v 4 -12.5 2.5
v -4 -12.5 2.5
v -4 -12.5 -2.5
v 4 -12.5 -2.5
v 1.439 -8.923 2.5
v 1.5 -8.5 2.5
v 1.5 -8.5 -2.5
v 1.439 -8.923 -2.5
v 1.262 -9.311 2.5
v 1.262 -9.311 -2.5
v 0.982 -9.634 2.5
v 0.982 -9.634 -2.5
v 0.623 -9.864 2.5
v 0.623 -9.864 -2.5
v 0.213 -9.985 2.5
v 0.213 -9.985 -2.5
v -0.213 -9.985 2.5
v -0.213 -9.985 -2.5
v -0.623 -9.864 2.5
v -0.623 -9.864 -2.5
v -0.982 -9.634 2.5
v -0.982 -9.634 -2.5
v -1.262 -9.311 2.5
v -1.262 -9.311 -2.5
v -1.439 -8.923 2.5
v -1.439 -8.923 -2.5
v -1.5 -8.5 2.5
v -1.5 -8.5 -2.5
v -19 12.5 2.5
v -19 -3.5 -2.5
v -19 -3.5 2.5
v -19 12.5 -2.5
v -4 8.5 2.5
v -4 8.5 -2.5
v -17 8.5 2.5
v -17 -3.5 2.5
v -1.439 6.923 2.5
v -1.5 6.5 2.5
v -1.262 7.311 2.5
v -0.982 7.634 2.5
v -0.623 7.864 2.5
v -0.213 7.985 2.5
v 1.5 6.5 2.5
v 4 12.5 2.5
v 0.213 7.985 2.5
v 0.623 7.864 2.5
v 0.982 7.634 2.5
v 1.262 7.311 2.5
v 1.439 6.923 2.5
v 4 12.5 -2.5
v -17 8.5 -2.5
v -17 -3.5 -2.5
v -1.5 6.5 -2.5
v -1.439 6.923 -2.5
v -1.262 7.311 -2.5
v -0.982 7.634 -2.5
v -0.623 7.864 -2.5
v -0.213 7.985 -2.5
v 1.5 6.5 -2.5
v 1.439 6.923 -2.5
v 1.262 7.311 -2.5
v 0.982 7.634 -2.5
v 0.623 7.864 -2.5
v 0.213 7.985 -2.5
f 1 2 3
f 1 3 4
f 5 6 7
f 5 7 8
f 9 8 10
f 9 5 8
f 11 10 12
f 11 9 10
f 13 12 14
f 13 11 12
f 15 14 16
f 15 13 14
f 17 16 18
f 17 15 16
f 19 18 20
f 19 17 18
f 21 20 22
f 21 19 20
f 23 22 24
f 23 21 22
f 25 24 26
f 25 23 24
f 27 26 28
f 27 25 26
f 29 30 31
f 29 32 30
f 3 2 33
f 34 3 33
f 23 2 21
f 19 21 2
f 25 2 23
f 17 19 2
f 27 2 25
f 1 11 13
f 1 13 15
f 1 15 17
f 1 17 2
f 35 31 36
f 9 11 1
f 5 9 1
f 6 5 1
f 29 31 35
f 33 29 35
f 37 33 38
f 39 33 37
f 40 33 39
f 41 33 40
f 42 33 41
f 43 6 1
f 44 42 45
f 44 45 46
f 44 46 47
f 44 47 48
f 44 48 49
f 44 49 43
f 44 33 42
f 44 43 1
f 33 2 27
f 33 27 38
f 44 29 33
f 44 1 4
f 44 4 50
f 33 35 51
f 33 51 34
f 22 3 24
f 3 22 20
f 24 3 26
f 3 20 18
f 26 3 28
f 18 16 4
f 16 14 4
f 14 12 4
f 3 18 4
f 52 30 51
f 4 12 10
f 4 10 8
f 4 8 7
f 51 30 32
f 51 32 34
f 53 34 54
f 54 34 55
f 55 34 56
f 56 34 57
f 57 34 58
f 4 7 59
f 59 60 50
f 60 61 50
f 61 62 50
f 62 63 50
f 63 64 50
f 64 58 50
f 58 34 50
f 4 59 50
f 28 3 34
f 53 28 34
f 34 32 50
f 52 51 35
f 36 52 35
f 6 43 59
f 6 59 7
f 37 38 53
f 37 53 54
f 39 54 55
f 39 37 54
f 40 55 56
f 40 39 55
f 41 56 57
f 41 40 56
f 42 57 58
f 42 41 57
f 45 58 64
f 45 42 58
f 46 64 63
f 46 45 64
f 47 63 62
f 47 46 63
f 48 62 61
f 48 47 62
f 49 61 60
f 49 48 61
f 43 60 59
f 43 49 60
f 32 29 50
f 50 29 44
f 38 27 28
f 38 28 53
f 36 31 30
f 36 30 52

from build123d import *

# Parameters (mm, degrees)
SKETCH1_W           = 8
SKETCH1_H           = 25
BOSS_EXTRUDE6_DEPTH = 2.5
SKETCH8_W           = 15
SKETCH8_H           = 4
BOSS_EXTRUDE7_DEPTH = 5
SKETCH9_W           = 2
SKETCH9_H           = 5
BOSS_EXTRUDE8_DEPTH = 12
CUT_EXTRUDE1_DEPTH  = 6


with BuildPart() as part:
    # Sketch1 → Boss-Extrude6 (new body, symmetric)
    with BuildSketch(Plane.XY):
        Rectangle(SKETCH1_W, SKETCH1_H)
    extrude(amount=BOSS_EXTRUDE6_DEPTH, both=True)

    # Sketch8 → Boss-Extrude7 (add)
    with BuildSketch(Plane.XY.offset(2.5)):
        with Locations((-11.5, 10.5)):
            Rectangle(SKETCH8_W, SKETCH8_H)
    extrude(amount=-BOSS_EXTRUDE7_DEPTH)

    # Sketch9 → Boss-Extrude8 (add)
    with BuildSketch(Plane.XZ.offset(-8.5)):
        with Locations((-18, 0)):
            Rectangle(SKETCH9_W, SKETCH9_H)
    extrude(amount=BOSS_EXTRUDE8_DEPTH)

    # Sketch10 → Cut-Extrude1 (cut, through all)
    with BuildSketch(Plane.XY.offset(2.5)):
        with BuildLine():
            Line((1.5, 6.5), (1.5, -8.5))
            ThreePointArc((1.5, -8.5), (0, -10), (-1.5, -8.5))
            Line((-1.5, -8.5), (-1.5, 6.5))
            ThreePointArc((-1.5, 6.5), (0, 8), (1.5, 6.5))
        make_face()
    extrude(amount=-CUT_EXTRUDE1_DEPTH, mode=Mode.SUBTRACT)


solid = part.part
